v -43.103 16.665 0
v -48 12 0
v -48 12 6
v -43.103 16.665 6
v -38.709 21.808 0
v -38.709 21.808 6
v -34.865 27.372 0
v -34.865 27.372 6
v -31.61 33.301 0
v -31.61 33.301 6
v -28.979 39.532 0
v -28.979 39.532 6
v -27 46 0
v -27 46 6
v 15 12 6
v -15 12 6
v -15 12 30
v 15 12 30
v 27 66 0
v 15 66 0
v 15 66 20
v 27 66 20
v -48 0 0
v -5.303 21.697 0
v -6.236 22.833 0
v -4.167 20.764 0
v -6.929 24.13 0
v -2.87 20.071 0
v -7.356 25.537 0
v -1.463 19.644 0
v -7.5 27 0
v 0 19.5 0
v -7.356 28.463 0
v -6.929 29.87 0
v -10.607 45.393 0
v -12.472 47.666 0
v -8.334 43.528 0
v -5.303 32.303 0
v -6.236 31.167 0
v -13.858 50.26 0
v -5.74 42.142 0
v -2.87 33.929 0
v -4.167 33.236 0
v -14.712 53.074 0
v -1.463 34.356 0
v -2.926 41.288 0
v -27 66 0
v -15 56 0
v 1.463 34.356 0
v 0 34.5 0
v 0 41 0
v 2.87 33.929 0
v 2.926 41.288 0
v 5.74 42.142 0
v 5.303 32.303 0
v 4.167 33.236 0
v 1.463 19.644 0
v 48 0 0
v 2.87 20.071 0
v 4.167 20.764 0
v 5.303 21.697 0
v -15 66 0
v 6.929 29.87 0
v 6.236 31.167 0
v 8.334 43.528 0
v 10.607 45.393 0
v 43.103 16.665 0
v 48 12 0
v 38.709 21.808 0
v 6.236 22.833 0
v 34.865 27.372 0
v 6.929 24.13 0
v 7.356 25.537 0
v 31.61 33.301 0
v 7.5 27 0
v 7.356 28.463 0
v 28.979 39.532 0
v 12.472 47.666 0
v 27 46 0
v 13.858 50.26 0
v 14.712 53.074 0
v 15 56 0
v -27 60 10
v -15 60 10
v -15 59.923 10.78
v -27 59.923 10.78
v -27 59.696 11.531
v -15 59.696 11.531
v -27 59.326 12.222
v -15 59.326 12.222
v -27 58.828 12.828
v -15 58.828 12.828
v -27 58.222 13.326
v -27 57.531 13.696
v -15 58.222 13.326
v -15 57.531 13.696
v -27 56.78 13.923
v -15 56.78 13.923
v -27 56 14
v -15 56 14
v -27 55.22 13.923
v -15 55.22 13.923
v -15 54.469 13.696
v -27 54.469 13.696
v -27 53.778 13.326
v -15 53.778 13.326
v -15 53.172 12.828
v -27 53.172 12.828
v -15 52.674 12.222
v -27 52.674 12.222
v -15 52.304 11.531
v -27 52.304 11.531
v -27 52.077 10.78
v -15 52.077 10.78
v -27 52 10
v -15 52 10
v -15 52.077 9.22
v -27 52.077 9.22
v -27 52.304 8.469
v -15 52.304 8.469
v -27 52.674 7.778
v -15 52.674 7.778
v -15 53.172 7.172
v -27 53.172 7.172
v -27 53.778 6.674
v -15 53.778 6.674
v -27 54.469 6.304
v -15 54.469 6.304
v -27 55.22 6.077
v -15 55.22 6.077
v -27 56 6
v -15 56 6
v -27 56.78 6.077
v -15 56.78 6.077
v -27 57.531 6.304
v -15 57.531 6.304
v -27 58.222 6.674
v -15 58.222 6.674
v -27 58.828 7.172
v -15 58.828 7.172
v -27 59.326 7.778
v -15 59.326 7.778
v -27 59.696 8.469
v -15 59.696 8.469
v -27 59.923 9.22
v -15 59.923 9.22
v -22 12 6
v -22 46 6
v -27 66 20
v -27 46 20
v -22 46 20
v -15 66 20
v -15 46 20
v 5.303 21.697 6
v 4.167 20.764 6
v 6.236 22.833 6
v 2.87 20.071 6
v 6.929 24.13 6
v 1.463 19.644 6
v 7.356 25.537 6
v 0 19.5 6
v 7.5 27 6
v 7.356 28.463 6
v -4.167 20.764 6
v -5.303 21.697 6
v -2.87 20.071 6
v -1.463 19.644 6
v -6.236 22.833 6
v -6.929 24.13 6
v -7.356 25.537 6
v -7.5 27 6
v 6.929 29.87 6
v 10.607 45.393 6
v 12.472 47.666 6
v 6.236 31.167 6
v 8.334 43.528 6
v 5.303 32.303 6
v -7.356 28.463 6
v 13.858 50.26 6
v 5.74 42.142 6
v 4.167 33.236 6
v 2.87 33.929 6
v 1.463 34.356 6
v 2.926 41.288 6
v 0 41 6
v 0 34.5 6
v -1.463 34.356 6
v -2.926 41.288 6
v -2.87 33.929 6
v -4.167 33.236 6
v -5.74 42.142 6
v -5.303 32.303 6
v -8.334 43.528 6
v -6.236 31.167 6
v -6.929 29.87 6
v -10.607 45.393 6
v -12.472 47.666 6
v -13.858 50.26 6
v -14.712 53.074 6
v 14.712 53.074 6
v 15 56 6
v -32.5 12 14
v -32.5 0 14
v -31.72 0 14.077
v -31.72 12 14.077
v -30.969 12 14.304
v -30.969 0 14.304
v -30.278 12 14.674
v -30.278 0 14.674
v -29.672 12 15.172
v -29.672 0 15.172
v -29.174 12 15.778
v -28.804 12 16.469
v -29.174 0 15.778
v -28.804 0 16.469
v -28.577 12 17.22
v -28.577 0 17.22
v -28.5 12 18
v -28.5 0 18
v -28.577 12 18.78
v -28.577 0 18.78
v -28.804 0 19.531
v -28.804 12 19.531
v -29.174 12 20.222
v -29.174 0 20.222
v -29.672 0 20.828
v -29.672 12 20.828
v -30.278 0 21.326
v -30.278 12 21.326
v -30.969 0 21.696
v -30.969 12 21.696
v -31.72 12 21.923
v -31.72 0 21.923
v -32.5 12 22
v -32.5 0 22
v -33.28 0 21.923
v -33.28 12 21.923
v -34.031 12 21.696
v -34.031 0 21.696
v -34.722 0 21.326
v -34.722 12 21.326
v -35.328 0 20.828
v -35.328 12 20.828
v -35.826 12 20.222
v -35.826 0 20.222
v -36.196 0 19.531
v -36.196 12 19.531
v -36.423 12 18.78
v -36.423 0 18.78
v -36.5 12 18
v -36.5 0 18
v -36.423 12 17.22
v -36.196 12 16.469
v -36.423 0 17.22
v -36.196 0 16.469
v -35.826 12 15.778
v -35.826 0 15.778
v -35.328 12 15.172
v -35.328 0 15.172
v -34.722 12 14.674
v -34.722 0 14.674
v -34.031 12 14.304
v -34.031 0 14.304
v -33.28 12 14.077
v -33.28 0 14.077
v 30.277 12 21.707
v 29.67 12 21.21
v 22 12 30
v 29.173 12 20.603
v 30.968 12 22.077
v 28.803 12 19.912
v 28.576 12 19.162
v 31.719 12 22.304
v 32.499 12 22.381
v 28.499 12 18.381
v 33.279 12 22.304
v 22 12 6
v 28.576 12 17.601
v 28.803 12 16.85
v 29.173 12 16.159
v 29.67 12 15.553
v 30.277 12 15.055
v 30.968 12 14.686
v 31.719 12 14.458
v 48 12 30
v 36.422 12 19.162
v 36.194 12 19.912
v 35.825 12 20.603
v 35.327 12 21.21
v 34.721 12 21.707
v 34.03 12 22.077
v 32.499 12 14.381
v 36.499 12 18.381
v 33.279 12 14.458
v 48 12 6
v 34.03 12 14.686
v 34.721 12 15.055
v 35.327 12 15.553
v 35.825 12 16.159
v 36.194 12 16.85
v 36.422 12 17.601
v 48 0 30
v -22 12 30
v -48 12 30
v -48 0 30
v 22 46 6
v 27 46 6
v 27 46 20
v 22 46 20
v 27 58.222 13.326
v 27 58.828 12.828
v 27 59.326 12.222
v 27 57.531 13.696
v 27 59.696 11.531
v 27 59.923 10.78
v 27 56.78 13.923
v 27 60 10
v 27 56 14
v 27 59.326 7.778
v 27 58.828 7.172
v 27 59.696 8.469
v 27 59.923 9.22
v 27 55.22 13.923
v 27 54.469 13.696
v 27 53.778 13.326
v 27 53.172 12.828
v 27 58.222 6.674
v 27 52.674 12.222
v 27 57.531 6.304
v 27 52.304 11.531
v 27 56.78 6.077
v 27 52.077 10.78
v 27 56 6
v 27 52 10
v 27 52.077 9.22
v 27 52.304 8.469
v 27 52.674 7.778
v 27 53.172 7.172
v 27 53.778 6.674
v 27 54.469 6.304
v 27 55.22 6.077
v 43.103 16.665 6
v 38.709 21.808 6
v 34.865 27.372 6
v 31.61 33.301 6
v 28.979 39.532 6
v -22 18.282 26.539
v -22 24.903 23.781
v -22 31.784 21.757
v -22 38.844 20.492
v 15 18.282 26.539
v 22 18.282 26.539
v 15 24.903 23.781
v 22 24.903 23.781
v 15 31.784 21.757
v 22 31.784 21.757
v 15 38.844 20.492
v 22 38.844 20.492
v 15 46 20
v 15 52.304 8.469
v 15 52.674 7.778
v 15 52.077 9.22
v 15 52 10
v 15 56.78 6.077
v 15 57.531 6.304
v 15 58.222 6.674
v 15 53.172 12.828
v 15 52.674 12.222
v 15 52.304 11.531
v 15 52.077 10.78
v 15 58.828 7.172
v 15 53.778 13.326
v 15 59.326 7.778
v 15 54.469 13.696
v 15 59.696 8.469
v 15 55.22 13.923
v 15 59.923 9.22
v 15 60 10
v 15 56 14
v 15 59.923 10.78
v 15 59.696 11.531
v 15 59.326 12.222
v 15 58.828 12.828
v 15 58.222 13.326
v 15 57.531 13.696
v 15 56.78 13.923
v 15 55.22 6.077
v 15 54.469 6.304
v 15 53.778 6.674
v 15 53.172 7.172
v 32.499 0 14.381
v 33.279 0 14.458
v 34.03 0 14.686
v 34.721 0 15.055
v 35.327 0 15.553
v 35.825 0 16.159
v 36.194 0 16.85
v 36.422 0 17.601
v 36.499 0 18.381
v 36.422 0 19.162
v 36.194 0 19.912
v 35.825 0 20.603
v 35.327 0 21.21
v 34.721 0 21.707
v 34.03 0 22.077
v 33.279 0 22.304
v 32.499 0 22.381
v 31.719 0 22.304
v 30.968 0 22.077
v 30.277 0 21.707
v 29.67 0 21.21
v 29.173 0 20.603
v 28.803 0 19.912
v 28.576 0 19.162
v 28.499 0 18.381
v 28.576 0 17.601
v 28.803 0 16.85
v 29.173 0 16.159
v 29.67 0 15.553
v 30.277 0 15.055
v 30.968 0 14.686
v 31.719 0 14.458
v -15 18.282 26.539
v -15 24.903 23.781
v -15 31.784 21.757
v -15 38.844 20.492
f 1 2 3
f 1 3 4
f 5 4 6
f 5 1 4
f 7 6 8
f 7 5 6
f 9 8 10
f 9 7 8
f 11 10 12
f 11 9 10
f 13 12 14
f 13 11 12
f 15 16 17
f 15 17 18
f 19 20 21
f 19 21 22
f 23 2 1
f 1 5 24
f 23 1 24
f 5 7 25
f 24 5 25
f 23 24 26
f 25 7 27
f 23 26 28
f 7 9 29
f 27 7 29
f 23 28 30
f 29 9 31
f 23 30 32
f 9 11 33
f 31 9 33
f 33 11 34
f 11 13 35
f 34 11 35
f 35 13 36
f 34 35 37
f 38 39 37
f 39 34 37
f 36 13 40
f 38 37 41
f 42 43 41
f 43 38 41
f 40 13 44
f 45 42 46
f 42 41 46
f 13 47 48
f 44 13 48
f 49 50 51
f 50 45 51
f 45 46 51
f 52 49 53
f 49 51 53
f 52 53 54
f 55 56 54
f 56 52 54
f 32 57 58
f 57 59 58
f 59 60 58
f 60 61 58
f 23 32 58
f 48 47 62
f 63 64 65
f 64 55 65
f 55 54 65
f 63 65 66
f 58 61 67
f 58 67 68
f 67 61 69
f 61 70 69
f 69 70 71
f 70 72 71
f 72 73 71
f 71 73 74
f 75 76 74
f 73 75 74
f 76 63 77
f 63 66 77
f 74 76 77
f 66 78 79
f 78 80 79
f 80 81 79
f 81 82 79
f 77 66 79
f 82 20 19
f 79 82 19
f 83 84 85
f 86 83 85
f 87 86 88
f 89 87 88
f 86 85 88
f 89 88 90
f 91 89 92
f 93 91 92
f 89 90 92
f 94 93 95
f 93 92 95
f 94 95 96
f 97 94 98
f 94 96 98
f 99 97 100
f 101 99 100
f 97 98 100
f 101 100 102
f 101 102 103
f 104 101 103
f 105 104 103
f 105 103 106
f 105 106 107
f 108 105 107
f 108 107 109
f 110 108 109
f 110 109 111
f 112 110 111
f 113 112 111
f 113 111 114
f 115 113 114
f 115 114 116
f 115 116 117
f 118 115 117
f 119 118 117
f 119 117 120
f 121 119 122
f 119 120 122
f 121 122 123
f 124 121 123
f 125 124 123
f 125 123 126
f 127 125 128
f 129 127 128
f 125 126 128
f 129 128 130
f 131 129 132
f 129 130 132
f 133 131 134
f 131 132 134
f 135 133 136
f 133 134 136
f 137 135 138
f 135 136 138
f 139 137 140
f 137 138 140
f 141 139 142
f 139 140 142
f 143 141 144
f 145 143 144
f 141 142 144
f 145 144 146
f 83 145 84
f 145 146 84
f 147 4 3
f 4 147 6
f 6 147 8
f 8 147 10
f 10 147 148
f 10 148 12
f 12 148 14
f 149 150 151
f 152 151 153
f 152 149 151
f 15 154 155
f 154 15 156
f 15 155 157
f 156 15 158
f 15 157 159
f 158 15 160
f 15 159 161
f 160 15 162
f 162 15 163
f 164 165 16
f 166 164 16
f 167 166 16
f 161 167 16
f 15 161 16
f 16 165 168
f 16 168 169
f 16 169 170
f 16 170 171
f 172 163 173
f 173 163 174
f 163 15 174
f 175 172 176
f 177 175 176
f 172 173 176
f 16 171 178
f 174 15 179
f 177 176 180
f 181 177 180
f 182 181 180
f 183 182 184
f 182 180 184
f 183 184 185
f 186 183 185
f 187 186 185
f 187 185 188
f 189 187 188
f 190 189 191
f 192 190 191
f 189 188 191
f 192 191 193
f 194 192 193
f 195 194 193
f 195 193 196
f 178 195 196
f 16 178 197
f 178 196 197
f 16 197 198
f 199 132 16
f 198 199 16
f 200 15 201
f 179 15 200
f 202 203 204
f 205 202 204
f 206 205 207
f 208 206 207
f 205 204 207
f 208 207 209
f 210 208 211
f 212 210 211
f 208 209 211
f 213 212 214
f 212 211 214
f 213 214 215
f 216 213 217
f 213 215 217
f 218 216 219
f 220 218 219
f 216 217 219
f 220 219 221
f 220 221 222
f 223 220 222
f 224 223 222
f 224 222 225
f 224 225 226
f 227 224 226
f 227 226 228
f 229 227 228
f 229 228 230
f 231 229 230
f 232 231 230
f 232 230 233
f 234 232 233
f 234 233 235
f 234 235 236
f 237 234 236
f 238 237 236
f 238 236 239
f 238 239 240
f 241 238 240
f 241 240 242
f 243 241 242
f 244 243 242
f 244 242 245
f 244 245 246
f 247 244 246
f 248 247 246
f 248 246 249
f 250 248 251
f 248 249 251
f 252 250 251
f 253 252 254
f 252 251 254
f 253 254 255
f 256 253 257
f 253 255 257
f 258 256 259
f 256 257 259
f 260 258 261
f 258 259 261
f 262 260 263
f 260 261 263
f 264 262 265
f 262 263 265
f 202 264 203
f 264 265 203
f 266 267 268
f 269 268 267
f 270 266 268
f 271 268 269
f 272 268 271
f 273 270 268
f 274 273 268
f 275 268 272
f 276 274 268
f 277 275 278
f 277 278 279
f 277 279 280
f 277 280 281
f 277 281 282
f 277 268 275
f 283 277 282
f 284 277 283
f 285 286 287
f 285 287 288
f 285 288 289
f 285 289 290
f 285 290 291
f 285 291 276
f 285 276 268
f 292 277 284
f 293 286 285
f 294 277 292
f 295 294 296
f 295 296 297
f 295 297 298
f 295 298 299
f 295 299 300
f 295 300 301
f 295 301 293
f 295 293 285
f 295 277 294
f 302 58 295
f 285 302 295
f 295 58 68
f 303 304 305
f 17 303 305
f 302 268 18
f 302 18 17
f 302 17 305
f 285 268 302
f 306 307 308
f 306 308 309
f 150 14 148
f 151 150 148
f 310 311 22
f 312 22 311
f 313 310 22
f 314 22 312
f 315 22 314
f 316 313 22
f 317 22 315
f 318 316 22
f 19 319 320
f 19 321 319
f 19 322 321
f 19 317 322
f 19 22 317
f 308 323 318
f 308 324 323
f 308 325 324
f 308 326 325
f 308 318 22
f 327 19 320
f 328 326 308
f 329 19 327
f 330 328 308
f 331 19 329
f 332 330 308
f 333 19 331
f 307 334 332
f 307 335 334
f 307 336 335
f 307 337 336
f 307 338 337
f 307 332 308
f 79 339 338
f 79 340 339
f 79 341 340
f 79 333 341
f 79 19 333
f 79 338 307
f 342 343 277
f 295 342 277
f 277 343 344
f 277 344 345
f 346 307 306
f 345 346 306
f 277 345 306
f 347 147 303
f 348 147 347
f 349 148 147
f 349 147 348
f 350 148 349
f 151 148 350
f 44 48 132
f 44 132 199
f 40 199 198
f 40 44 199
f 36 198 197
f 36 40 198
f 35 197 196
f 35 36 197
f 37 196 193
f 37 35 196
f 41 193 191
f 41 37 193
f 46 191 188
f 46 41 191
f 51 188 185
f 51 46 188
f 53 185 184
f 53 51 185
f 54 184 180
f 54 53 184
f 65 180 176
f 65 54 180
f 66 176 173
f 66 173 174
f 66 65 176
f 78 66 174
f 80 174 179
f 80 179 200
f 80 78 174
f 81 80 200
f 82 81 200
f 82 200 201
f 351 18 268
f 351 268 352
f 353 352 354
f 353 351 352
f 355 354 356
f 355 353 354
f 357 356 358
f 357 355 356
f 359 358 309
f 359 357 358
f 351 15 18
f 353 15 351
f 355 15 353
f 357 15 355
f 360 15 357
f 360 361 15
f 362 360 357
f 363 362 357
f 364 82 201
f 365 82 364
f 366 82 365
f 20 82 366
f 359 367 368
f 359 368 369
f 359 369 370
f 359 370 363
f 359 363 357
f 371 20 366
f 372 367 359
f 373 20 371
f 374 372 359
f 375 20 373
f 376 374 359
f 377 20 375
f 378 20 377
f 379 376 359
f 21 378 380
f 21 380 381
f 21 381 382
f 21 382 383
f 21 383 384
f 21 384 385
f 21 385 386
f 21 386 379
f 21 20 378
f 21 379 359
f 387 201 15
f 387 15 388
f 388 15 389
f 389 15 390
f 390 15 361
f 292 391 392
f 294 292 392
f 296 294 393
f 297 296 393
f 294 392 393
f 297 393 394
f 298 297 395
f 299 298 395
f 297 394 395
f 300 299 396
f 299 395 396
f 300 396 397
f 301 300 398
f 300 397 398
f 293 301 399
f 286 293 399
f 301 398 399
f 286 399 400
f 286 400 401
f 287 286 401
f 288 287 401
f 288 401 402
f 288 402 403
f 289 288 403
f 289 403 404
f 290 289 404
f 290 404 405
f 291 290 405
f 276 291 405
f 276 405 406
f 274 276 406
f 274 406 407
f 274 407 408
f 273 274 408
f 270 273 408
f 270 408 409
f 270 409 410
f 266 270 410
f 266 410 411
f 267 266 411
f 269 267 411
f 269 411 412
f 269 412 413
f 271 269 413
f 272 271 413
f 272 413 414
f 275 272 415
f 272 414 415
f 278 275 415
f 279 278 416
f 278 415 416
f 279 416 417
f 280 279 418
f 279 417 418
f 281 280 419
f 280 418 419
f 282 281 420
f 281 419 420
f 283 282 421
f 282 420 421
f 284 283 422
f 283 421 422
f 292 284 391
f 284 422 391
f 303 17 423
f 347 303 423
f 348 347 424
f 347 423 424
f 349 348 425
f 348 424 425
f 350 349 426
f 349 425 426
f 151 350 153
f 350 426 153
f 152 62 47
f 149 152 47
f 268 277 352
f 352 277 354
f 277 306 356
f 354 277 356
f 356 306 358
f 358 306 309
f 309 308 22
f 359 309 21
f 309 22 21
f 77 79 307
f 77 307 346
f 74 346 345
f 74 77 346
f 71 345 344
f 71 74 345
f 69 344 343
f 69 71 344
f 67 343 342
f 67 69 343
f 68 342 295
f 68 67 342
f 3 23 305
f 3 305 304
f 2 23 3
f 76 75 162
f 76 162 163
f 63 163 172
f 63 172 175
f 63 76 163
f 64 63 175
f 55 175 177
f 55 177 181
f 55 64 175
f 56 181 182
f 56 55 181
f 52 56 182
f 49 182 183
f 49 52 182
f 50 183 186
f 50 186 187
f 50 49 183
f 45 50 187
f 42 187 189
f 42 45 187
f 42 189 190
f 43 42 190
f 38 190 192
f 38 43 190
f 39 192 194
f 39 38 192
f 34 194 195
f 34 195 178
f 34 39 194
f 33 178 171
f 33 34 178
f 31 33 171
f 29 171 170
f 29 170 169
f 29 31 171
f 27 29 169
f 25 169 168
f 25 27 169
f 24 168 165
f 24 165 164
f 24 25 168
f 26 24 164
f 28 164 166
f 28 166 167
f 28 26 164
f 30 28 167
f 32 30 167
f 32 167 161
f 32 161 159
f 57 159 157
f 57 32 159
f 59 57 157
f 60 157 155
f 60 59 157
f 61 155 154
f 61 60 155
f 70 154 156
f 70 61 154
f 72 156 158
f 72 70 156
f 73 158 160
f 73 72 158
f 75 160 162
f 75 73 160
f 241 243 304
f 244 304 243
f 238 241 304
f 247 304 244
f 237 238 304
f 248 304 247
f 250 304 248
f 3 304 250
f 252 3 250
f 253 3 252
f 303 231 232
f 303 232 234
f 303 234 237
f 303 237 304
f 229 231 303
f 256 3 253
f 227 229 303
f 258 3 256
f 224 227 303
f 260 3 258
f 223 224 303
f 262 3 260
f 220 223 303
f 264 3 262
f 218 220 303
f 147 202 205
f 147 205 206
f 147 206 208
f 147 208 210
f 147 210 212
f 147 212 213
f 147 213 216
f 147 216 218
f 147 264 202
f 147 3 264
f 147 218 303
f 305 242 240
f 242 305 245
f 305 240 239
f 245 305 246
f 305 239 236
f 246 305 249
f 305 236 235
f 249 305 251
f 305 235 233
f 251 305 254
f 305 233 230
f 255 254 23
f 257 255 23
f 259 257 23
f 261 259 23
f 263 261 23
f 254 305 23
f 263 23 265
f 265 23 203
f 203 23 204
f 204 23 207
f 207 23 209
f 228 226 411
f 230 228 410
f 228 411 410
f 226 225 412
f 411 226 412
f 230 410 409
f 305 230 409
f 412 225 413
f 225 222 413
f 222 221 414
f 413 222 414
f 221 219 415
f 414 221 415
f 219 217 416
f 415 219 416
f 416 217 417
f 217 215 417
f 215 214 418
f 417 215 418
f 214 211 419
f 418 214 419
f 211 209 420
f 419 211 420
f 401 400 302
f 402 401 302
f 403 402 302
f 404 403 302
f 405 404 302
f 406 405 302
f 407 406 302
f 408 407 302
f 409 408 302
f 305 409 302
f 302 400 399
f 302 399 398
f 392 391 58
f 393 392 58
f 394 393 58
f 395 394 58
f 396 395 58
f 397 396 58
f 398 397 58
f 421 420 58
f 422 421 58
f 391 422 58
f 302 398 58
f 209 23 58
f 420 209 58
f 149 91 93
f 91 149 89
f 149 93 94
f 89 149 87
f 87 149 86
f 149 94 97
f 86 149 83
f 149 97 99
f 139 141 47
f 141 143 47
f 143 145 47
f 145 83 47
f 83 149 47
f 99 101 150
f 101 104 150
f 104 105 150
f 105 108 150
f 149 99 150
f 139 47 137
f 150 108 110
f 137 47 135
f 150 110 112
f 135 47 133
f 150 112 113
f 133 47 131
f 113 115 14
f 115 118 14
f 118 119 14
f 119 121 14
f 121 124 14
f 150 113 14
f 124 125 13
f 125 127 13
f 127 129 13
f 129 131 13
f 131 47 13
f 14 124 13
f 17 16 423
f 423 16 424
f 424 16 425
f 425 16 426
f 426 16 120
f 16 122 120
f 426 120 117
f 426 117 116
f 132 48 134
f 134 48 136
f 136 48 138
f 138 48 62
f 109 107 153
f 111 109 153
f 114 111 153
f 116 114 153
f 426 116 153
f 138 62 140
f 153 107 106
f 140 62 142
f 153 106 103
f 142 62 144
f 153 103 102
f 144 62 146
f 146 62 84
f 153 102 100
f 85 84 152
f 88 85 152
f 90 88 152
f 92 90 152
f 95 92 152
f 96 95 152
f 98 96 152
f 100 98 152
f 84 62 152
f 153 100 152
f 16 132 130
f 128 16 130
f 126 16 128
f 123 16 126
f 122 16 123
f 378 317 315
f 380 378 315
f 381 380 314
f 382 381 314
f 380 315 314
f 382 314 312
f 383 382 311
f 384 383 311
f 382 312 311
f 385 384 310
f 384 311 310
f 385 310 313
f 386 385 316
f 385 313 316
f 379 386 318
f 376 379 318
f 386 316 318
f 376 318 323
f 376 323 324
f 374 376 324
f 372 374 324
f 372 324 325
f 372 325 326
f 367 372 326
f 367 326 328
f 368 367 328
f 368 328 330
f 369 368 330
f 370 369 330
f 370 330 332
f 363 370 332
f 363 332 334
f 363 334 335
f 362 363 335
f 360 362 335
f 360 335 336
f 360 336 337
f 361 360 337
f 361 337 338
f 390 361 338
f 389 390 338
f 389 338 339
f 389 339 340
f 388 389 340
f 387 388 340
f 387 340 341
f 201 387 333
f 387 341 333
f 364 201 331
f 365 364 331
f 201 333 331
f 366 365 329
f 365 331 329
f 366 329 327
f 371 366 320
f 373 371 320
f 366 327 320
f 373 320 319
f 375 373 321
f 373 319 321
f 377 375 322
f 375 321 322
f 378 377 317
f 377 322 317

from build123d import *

# Parameters (mm, degrees)
SKETCH1_W             = 96
SKETCH1_H             = 12
BOSS_EXTRUDE1_DEPTH   = 30
SKETCH1_3_R           = 7.5
BOSS_EXTRUDE2_DEPTH   = 6
SKETCH1_4_W           = 12
SKETCH1_4_H           = 20
BOSS_EXTRUDE3_DEPTH   = 20
BOSS_EXTRUDE4_DEPTH   = 7
F_8_0MM_DOWEL_HOLE1_D = 8
F_8_0MM_DOWEL_HOLE2_D = 8


with BuildPart() as part:
    # Sketch1 → Boss-Extrude1 (new body)
    with BuildSketch(Plane.XY):
        with Locations((0, 6)):
            Rectangle(SKETCH1_W, SKETCH1_H)
    extrude(amount=BOSS_EXTRUDE1_DEPTH)

    # Sketch1<3> → Boss-Extrude2 (add)
    with BuildSketch(Plane.XY):
        with BuildLine():
            Line((-15, 46), (-27, 46))
            ThreePointArc((-27, 46), (-34.864825613, 27.37239229), (-48, 12))
            Line((-48, 12), (48, 12))
            ThreePointArc((48, 12), (34.864825613, 27.37239229), (27, 46))
            Line((27, 46), (15, 46))
            Line((15, 46), (15, 56))
            ThreePointArc((15, 56), (0, 41), (-15, 56))
            Line((-15, 56), (-15, 46))
        make_face()
        with Locations((0, 27)):
            Circle(SKETCH1_3_R, mode=Mode.SUBTRACT)
    extrude(amount=BOSS_EXTRUDE2_DEPTH)

    # Sketch1<4> → Boss-Extrude3 (add)
    with BuildSketch(Plane.XY):
        with Locations((-21, 56)):
            Rectangle(SKETCH1_4_W, SKETCH1_4_H)
        with Locations((21, 56)):
            Rectangle(SKETCH1_4_W, SKETCH1_4_H)
    extrude(amount=BOSS_EXTRUDE3_DEPTH)

    # Sketch2 → Boss-Extrude4 (add)
    with BuildSketch(Plane(origin=(-15, 0, 0), x_dir=(0, 0, -1), z_dir=(1, 0, 0))):
        with BuildLine():
            Line((-20, 46), (-6, 46))
            Line((-6, 46), (-6, 12))
            Line((-6, 12), (-30, 12))
            ThreePointArc((-30, 12), (-22.675193853, 28.316233486), (-20, 46))
        make_face()
    boss_extrude4 = extrude(amount=-BOSS_EXTRUDE4_DEPTH)

    # Mirror1: Boss-Extrude4 across plane
    add(boss_extrude4.mirror(Plane(origin=(0, 0, 0), x_dir=(0, 0, 1), z_dir=(1, 0, 0))))

    # Ø8.0mm Dowel Hole1 (through all)
    with Locations(Plane(origin=(-27, 56, 10), x_dir=(0, -1, 0), z_dir=(-1, 0, 0))):
        with Locations((0, 0)):
            Hole(F_8_0MM_DOWEL_HOLE1_D / 2)

    # Ø8.0mm Dowel Hole2 (through all)
    with Locations(Plane(origin=(-32.5, 12, 18), x_dir=(0, 0, 1), z_dir=(0, 1, 0))):
        with Locations((0, 0), (0.381139368, 64.99888255)):
            Hole(F_8_0MM_DOWEL_HOLE2_D / 2)


solid = part.part
